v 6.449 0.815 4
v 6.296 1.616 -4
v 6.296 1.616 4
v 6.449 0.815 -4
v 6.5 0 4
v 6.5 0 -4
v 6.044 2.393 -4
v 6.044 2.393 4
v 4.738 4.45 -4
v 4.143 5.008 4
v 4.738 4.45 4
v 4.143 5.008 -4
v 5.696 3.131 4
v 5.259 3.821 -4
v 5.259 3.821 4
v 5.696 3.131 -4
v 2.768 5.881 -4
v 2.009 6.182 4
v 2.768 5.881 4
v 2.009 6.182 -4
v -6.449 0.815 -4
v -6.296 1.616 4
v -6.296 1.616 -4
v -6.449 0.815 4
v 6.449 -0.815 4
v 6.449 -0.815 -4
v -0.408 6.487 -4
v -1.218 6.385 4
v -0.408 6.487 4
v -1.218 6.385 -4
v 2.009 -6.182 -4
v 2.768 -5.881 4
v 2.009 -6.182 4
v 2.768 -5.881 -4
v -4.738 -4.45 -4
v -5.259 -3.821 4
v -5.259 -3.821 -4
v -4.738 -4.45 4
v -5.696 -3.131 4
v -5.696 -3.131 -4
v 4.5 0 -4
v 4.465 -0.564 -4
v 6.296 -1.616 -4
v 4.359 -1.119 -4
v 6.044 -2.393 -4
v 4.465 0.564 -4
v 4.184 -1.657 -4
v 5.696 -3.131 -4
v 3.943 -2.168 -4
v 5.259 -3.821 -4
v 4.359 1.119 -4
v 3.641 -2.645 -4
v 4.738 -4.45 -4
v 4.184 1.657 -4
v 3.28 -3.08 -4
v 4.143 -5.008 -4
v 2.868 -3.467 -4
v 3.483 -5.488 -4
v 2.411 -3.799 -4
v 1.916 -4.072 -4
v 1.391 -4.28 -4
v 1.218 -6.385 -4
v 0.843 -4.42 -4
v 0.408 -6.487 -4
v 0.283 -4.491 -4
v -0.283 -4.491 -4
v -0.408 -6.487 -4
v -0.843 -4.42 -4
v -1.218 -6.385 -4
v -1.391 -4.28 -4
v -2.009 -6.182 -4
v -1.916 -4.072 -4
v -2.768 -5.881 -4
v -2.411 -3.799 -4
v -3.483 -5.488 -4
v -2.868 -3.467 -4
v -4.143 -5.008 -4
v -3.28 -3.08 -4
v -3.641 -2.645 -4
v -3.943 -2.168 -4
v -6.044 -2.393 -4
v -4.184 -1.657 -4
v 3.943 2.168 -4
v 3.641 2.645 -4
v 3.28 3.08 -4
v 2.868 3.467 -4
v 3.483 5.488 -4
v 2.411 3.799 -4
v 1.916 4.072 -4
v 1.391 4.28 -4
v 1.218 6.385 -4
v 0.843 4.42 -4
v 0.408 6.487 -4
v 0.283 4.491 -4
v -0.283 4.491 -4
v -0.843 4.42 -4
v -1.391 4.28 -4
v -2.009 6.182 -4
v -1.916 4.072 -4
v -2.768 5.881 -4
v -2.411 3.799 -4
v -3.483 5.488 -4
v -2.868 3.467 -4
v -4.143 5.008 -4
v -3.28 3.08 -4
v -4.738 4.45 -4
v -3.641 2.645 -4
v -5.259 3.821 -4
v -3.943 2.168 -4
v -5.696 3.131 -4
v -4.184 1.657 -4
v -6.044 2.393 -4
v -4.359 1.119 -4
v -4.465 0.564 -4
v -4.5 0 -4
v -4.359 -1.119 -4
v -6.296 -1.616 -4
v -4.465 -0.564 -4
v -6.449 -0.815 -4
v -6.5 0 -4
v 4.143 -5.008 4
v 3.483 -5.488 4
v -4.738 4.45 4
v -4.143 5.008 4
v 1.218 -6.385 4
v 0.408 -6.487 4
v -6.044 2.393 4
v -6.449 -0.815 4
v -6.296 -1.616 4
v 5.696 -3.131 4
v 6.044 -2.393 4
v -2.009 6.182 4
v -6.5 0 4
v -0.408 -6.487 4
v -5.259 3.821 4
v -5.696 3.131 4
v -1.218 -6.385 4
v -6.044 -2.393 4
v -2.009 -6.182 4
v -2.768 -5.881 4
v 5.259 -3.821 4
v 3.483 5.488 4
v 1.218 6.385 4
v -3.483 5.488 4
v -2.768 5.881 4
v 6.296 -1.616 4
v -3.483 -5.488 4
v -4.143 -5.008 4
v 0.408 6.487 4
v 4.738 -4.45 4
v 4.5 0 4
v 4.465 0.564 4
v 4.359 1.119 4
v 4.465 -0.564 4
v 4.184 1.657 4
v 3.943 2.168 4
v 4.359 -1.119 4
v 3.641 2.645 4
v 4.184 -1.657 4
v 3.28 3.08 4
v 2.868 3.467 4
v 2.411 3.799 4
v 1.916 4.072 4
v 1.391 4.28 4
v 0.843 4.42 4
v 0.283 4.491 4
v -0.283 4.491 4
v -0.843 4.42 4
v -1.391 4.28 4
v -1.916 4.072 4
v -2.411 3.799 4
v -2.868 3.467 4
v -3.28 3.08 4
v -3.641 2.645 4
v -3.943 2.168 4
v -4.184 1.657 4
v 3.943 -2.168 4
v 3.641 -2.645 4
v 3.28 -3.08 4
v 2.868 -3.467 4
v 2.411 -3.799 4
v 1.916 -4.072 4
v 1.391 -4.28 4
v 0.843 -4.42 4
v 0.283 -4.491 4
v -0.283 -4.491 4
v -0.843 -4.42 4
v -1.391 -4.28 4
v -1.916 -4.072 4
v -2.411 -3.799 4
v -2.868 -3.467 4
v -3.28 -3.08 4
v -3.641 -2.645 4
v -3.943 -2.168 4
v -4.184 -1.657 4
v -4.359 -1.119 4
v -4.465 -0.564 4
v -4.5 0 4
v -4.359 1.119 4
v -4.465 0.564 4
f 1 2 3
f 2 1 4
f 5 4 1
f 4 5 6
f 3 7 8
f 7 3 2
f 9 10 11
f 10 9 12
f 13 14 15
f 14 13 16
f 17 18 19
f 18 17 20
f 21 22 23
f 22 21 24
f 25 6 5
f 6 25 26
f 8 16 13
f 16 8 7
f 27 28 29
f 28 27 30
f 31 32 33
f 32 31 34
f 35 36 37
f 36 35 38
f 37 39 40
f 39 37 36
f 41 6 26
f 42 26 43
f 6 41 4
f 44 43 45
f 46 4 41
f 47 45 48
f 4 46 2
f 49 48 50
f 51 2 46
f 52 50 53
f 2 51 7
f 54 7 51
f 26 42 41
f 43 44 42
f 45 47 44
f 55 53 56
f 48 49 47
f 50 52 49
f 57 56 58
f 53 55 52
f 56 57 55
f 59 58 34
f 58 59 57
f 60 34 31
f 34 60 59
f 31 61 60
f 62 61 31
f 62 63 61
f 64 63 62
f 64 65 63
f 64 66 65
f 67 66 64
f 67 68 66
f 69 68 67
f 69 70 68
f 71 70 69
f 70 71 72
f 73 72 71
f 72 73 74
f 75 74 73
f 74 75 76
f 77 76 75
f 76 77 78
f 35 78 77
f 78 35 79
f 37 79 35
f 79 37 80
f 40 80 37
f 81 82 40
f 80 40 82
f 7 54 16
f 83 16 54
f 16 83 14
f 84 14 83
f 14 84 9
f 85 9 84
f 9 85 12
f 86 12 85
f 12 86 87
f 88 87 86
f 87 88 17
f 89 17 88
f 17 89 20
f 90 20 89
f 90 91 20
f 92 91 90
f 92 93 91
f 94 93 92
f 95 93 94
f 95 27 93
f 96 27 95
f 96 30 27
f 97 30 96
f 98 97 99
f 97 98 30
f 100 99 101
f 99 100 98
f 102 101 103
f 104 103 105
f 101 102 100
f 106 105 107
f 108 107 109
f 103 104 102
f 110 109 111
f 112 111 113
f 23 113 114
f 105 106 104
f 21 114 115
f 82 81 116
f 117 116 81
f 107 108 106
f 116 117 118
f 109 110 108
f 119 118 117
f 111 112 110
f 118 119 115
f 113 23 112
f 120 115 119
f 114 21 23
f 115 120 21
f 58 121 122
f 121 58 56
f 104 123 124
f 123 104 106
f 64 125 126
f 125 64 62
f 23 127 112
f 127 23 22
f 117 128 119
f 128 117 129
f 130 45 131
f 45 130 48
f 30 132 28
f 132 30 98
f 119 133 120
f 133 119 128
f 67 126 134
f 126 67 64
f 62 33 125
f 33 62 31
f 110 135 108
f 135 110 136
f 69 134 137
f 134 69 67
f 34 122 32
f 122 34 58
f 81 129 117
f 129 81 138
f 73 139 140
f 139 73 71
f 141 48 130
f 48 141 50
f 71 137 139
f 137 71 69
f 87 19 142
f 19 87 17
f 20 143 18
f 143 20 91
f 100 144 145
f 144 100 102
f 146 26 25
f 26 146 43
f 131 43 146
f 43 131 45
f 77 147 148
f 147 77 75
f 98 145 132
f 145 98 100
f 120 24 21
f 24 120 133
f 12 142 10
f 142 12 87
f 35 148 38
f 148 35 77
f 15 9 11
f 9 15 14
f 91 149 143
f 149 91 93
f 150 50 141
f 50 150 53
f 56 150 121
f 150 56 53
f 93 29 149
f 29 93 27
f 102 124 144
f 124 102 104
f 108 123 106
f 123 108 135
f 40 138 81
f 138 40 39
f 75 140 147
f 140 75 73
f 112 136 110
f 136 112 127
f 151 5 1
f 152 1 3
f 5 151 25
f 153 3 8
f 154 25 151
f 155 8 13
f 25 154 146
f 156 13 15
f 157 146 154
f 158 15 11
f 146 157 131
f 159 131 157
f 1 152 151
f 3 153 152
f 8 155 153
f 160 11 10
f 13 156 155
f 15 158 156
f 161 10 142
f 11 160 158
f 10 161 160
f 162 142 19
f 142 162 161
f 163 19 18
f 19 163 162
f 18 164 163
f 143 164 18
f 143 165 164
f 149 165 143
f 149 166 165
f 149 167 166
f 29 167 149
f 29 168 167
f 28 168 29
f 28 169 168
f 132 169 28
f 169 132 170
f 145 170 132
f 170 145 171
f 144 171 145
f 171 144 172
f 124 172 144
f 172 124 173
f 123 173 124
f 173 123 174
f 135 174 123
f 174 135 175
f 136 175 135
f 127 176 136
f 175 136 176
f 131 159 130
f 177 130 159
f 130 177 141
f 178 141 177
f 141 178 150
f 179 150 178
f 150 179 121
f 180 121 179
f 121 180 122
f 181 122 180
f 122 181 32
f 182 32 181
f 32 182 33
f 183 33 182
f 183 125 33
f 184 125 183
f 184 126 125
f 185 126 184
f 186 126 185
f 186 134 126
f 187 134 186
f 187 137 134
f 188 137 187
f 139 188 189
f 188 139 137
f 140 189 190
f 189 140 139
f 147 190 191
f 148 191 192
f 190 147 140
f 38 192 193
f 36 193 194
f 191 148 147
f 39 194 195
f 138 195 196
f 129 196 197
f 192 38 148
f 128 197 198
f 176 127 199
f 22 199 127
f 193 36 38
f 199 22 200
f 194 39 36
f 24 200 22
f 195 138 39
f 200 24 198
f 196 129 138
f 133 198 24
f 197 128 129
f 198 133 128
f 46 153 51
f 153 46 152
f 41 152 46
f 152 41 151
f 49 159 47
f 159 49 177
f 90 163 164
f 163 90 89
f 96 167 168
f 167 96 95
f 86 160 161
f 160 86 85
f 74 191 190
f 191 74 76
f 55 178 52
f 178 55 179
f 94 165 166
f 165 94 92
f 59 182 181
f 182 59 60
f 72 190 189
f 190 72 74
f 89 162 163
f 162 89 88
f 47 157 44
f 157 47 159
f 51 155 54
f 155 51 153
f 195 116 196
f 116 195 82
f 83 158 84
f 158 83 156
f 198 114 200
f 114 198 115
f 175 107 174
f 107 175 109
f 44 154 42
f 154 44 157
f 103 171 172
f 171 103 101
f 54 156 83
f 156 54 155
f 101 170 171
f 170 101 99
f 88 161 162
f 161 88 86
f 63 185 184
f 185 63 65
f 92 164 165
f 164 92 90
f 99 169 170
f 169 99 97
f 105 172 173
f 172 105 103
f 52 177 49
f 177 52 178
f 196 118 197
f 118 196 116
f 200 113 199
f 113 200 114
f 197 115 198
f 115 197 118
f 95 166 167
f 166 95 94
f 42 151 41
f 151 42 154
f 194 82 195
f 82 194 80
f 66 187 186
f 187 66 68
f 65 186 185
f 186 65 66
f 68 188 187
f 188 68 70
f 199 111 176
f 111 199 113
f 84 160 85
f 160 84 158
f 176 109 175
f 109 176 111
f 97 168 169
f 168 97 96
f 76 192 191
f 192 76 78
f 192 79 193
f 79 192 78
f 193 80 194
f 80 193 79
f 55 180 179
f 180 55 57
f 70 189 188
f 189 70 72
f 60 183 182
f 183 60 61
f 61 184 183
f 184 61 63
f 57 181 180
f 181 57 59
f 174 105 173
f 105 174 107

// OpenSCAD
$fn = 50;


difference() {
	union() {
		translate(v = [0, 0, -4.0000000000]) {
			cylinder(h = 8, r = 6.5000000000);
		}
	}
	union() {
		translate(v = [0, 0, -100.0000000000]) {
			cylinder(h = 200, r = 4.5000000000);
		}
	}
}
